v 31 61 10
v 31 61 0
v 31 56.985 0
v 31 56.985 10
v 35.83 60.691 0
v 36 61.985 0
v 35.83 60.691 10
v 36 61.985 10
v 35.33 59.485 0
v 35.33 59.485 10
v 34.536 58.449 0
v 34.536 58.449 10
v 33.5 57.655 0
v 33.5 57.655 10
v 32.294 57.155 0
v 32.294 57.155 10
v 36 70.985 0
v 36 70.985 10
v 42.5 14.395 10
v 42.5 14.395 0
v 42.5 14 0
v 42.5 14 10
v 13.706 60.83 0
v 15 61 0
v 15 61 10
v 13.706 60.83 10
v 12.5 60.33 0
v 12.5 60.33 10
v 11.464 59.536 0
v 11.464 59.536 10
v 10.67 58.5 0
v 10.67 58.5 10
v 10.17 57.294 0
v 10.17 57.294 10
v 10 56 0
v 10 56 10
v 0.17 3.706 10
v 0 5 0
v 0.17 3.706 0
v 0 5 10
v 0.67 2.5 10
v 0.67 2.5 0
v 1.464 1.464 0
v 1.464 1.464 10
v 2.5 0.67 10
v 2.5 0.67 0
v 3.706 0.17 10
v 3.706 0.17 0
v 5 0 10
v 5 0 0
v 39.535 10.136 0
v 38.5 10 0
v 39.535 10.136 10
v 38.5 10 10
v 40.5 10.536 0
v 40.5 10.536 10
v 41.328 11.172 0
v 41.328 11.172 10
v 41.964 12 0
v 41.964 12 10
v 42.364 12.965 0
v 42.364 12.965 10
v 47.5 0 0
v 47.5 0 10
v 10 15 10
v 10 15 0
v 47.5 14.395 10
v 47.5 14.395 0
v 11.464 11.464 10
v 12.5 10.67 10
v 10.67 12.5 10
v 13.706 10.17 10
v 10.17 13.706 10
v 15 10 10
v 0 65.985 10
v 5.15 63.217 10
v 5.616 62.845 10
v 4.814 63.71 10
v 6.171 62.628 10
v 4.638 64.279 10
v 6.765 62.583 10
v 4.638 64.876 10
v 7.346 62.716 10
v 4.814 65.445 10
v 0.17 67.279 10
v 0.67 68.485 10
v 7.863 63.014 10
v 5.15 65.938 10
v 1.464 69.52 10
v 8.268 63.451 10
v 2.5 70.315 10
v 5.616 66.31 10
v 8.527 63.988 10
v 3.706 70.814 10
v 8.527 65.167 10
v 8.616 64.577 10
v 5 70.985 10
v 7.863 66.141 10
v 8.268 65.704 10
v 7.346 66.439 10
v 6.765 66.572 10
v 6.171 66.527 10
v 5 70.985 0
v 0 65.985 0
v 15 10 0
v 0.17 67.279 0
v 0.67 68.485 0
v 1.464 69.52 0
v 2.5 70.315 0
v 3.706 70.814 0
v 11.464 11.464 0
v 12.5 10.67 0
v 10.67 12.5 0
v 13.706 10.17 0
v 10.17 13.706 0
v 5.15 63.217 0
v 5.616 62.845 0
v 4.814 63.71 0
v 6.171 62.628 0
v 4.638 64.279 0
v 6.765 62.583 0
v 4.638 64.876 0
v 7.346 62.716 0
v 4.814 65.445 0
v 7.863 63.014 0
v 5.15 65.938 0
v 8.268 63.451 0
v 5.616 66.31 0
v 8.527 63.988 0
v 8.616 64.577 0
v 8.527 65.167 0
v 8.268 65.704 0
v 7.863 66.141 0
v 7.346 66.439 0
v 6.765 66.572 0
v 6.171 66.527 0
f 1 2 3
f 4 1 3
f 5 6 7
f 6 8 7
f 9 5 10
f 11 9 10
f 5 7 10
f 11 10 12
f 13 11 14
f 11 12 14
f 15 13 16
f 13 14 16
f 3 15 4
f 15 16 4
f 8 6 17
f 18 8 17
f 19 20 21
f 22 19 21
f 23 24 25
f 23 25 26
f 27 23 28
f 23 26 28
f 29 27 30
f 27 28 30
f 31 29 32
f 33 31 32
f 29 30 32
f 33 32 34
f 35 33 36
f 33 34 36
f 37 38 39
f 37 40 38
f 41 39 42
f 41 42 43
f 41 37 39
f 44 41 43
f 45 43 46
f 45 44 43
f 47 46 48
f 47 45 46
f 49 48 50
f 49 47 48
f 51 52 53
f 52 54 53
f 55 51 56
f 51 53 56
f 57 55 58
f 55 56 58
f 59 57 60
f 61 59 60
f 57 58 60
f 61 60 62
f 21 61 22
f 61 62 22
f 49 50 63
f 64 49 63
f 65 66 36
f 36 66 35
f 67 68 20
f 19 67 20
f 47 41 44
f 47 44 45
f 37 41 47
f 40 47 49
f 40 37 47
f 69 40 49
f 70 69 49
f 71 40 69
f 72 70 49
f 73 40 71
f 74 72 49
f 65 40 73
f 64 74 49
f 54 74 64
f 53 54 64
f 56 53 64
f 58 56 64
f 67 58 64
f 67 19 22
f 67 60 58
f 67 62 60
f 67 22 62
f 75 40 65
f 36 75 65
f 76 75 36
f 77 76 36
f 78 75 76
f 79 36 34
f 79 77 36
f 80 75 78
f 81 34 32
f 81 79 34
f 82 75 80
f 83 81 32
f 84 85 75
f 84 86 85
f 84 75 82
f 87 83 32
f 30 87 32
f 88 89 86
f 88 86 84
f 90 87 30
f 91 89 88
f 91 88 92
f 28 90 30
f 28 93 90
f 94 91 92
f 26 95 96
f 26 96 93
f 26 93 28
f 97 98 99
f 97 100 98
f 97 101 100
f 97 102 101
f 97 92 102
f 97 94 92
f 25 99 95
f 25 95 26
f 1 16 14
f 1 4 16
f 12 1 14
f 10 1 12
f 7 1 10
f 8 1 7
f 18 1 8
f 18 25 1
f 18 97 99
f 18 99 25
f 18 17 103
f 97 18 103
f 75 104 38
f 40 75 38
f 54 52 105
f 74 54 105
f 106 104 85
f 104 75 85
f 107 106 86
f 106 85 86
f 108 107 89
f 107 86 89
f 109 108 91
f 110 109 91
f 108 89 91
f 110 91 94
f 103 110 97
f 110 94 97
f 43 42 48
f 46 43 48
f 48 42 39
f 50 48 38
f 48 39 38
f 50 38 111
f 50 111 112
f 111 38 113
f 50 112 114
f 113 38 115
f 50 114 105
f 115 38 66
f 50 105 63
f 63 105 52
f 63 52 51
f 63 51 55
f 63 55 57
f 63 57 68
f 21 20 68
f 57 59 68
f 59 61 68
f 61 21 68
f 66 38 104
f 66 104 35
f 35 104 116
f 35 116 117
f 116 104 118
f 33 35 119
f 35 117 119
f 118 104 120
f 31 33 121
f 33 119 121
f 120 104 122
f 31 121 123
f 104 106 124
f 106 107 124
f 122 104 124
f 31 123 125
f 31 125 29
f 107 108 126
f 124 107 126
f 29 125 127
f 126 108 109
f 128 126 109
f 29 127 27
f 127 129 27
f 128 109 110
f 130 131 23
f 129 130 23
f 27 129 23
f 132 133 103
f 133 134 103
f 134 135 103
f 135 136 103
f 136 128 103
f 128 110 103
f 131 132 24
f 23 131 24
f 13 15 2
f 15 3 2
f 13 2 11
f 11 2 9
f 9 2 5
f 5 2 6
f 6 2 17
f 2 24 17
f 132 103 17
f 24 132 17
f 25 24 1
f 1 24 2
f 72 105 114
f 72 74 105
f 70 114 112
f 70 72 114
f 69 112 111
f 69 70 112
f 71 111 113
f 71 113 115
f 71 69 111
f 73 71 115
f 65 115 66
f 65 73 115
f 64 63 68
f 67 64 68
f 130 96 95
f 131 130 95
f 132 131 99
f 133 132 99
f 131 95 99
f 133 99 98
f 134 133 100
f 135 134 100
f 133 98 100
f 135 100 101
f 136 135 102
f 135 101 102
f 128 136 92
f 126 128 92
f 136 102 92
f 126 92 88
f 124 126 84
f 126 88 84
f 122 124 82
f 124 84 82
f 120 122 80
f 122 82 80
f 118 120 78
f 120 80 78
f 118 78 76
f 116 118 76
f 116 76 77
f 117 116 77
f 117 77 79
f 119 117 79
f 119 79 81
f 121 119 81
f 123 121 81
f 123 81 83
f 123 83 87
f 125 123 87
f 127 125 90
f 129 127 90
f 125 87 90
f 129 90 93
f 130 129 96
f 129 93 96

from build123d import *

# Parameters (mm, degrees)
F1_DEPTH = 10
F2_R     = 5
F3_R     = 4.99999
F5_R     = 4
F6_R     = 2
F7_DEPTH = 10


# Not quite as in the source:
# - two fillets or chamfers of one size are made in one step
# - a fillet or chamfer is up to 0.001 mm smaller than in the source, because OpenCascade refuses the exact size


with BuildPart() as f1:
    # F0 (on Top) → F1 (new body)
    with BuildSketch(Plane.XY):
        Polygon((0, 70.9848281697), (0, 0), (36, 0), (47.5, 0), (47.5, 14.3951736391), (42.5, 14.3951736391), (42.5, 10), (36, 10), (10, 10), (10, 61), (26.8777515739, 61), (31, 61), (31, 56.9848281697), (36, 56.9848281697), (36, 70.9848281697), align=None)
    extrude(amount=F1_DEPTH)

    # F2
    f2_edges = [f1.edges().sort_by_distance(p)[0] for p in [
        (0, 0, 5),
        (0, 70.984828, 5),
    ]]
    fillet(f2_edges, radius=F2_R)

    # F3 (radius 5 in the source; OpenCascade refuses exactly that, so slightly less here)
    f3_edges = [f1.edges().sort_by_distance(p)[0] for p in [
        (10, 10, 5),
        (36, 56.984828, 5),
        (10, 61, 5),
    ]]
    fillet(f3_edges, radius=F3_R)

    # F5
    f5_edges = [f1.edges().sort_by_distance(p)[0] for p in [
        (42.5, 10, 5),
    ]]
    fillet(f5_edges, radius=F5_R)

    # F6 (on face) → F7 (cut, through all)
    with BuildSketch(Plane.XY.offset(10)):
        with Locations((6.6156452522, 64.5774751902)):
            Circle(F6_R)
    extrude(amount=-F7_DEPTH, mode=Mode.SUBTRACT)


solid = f1.part
